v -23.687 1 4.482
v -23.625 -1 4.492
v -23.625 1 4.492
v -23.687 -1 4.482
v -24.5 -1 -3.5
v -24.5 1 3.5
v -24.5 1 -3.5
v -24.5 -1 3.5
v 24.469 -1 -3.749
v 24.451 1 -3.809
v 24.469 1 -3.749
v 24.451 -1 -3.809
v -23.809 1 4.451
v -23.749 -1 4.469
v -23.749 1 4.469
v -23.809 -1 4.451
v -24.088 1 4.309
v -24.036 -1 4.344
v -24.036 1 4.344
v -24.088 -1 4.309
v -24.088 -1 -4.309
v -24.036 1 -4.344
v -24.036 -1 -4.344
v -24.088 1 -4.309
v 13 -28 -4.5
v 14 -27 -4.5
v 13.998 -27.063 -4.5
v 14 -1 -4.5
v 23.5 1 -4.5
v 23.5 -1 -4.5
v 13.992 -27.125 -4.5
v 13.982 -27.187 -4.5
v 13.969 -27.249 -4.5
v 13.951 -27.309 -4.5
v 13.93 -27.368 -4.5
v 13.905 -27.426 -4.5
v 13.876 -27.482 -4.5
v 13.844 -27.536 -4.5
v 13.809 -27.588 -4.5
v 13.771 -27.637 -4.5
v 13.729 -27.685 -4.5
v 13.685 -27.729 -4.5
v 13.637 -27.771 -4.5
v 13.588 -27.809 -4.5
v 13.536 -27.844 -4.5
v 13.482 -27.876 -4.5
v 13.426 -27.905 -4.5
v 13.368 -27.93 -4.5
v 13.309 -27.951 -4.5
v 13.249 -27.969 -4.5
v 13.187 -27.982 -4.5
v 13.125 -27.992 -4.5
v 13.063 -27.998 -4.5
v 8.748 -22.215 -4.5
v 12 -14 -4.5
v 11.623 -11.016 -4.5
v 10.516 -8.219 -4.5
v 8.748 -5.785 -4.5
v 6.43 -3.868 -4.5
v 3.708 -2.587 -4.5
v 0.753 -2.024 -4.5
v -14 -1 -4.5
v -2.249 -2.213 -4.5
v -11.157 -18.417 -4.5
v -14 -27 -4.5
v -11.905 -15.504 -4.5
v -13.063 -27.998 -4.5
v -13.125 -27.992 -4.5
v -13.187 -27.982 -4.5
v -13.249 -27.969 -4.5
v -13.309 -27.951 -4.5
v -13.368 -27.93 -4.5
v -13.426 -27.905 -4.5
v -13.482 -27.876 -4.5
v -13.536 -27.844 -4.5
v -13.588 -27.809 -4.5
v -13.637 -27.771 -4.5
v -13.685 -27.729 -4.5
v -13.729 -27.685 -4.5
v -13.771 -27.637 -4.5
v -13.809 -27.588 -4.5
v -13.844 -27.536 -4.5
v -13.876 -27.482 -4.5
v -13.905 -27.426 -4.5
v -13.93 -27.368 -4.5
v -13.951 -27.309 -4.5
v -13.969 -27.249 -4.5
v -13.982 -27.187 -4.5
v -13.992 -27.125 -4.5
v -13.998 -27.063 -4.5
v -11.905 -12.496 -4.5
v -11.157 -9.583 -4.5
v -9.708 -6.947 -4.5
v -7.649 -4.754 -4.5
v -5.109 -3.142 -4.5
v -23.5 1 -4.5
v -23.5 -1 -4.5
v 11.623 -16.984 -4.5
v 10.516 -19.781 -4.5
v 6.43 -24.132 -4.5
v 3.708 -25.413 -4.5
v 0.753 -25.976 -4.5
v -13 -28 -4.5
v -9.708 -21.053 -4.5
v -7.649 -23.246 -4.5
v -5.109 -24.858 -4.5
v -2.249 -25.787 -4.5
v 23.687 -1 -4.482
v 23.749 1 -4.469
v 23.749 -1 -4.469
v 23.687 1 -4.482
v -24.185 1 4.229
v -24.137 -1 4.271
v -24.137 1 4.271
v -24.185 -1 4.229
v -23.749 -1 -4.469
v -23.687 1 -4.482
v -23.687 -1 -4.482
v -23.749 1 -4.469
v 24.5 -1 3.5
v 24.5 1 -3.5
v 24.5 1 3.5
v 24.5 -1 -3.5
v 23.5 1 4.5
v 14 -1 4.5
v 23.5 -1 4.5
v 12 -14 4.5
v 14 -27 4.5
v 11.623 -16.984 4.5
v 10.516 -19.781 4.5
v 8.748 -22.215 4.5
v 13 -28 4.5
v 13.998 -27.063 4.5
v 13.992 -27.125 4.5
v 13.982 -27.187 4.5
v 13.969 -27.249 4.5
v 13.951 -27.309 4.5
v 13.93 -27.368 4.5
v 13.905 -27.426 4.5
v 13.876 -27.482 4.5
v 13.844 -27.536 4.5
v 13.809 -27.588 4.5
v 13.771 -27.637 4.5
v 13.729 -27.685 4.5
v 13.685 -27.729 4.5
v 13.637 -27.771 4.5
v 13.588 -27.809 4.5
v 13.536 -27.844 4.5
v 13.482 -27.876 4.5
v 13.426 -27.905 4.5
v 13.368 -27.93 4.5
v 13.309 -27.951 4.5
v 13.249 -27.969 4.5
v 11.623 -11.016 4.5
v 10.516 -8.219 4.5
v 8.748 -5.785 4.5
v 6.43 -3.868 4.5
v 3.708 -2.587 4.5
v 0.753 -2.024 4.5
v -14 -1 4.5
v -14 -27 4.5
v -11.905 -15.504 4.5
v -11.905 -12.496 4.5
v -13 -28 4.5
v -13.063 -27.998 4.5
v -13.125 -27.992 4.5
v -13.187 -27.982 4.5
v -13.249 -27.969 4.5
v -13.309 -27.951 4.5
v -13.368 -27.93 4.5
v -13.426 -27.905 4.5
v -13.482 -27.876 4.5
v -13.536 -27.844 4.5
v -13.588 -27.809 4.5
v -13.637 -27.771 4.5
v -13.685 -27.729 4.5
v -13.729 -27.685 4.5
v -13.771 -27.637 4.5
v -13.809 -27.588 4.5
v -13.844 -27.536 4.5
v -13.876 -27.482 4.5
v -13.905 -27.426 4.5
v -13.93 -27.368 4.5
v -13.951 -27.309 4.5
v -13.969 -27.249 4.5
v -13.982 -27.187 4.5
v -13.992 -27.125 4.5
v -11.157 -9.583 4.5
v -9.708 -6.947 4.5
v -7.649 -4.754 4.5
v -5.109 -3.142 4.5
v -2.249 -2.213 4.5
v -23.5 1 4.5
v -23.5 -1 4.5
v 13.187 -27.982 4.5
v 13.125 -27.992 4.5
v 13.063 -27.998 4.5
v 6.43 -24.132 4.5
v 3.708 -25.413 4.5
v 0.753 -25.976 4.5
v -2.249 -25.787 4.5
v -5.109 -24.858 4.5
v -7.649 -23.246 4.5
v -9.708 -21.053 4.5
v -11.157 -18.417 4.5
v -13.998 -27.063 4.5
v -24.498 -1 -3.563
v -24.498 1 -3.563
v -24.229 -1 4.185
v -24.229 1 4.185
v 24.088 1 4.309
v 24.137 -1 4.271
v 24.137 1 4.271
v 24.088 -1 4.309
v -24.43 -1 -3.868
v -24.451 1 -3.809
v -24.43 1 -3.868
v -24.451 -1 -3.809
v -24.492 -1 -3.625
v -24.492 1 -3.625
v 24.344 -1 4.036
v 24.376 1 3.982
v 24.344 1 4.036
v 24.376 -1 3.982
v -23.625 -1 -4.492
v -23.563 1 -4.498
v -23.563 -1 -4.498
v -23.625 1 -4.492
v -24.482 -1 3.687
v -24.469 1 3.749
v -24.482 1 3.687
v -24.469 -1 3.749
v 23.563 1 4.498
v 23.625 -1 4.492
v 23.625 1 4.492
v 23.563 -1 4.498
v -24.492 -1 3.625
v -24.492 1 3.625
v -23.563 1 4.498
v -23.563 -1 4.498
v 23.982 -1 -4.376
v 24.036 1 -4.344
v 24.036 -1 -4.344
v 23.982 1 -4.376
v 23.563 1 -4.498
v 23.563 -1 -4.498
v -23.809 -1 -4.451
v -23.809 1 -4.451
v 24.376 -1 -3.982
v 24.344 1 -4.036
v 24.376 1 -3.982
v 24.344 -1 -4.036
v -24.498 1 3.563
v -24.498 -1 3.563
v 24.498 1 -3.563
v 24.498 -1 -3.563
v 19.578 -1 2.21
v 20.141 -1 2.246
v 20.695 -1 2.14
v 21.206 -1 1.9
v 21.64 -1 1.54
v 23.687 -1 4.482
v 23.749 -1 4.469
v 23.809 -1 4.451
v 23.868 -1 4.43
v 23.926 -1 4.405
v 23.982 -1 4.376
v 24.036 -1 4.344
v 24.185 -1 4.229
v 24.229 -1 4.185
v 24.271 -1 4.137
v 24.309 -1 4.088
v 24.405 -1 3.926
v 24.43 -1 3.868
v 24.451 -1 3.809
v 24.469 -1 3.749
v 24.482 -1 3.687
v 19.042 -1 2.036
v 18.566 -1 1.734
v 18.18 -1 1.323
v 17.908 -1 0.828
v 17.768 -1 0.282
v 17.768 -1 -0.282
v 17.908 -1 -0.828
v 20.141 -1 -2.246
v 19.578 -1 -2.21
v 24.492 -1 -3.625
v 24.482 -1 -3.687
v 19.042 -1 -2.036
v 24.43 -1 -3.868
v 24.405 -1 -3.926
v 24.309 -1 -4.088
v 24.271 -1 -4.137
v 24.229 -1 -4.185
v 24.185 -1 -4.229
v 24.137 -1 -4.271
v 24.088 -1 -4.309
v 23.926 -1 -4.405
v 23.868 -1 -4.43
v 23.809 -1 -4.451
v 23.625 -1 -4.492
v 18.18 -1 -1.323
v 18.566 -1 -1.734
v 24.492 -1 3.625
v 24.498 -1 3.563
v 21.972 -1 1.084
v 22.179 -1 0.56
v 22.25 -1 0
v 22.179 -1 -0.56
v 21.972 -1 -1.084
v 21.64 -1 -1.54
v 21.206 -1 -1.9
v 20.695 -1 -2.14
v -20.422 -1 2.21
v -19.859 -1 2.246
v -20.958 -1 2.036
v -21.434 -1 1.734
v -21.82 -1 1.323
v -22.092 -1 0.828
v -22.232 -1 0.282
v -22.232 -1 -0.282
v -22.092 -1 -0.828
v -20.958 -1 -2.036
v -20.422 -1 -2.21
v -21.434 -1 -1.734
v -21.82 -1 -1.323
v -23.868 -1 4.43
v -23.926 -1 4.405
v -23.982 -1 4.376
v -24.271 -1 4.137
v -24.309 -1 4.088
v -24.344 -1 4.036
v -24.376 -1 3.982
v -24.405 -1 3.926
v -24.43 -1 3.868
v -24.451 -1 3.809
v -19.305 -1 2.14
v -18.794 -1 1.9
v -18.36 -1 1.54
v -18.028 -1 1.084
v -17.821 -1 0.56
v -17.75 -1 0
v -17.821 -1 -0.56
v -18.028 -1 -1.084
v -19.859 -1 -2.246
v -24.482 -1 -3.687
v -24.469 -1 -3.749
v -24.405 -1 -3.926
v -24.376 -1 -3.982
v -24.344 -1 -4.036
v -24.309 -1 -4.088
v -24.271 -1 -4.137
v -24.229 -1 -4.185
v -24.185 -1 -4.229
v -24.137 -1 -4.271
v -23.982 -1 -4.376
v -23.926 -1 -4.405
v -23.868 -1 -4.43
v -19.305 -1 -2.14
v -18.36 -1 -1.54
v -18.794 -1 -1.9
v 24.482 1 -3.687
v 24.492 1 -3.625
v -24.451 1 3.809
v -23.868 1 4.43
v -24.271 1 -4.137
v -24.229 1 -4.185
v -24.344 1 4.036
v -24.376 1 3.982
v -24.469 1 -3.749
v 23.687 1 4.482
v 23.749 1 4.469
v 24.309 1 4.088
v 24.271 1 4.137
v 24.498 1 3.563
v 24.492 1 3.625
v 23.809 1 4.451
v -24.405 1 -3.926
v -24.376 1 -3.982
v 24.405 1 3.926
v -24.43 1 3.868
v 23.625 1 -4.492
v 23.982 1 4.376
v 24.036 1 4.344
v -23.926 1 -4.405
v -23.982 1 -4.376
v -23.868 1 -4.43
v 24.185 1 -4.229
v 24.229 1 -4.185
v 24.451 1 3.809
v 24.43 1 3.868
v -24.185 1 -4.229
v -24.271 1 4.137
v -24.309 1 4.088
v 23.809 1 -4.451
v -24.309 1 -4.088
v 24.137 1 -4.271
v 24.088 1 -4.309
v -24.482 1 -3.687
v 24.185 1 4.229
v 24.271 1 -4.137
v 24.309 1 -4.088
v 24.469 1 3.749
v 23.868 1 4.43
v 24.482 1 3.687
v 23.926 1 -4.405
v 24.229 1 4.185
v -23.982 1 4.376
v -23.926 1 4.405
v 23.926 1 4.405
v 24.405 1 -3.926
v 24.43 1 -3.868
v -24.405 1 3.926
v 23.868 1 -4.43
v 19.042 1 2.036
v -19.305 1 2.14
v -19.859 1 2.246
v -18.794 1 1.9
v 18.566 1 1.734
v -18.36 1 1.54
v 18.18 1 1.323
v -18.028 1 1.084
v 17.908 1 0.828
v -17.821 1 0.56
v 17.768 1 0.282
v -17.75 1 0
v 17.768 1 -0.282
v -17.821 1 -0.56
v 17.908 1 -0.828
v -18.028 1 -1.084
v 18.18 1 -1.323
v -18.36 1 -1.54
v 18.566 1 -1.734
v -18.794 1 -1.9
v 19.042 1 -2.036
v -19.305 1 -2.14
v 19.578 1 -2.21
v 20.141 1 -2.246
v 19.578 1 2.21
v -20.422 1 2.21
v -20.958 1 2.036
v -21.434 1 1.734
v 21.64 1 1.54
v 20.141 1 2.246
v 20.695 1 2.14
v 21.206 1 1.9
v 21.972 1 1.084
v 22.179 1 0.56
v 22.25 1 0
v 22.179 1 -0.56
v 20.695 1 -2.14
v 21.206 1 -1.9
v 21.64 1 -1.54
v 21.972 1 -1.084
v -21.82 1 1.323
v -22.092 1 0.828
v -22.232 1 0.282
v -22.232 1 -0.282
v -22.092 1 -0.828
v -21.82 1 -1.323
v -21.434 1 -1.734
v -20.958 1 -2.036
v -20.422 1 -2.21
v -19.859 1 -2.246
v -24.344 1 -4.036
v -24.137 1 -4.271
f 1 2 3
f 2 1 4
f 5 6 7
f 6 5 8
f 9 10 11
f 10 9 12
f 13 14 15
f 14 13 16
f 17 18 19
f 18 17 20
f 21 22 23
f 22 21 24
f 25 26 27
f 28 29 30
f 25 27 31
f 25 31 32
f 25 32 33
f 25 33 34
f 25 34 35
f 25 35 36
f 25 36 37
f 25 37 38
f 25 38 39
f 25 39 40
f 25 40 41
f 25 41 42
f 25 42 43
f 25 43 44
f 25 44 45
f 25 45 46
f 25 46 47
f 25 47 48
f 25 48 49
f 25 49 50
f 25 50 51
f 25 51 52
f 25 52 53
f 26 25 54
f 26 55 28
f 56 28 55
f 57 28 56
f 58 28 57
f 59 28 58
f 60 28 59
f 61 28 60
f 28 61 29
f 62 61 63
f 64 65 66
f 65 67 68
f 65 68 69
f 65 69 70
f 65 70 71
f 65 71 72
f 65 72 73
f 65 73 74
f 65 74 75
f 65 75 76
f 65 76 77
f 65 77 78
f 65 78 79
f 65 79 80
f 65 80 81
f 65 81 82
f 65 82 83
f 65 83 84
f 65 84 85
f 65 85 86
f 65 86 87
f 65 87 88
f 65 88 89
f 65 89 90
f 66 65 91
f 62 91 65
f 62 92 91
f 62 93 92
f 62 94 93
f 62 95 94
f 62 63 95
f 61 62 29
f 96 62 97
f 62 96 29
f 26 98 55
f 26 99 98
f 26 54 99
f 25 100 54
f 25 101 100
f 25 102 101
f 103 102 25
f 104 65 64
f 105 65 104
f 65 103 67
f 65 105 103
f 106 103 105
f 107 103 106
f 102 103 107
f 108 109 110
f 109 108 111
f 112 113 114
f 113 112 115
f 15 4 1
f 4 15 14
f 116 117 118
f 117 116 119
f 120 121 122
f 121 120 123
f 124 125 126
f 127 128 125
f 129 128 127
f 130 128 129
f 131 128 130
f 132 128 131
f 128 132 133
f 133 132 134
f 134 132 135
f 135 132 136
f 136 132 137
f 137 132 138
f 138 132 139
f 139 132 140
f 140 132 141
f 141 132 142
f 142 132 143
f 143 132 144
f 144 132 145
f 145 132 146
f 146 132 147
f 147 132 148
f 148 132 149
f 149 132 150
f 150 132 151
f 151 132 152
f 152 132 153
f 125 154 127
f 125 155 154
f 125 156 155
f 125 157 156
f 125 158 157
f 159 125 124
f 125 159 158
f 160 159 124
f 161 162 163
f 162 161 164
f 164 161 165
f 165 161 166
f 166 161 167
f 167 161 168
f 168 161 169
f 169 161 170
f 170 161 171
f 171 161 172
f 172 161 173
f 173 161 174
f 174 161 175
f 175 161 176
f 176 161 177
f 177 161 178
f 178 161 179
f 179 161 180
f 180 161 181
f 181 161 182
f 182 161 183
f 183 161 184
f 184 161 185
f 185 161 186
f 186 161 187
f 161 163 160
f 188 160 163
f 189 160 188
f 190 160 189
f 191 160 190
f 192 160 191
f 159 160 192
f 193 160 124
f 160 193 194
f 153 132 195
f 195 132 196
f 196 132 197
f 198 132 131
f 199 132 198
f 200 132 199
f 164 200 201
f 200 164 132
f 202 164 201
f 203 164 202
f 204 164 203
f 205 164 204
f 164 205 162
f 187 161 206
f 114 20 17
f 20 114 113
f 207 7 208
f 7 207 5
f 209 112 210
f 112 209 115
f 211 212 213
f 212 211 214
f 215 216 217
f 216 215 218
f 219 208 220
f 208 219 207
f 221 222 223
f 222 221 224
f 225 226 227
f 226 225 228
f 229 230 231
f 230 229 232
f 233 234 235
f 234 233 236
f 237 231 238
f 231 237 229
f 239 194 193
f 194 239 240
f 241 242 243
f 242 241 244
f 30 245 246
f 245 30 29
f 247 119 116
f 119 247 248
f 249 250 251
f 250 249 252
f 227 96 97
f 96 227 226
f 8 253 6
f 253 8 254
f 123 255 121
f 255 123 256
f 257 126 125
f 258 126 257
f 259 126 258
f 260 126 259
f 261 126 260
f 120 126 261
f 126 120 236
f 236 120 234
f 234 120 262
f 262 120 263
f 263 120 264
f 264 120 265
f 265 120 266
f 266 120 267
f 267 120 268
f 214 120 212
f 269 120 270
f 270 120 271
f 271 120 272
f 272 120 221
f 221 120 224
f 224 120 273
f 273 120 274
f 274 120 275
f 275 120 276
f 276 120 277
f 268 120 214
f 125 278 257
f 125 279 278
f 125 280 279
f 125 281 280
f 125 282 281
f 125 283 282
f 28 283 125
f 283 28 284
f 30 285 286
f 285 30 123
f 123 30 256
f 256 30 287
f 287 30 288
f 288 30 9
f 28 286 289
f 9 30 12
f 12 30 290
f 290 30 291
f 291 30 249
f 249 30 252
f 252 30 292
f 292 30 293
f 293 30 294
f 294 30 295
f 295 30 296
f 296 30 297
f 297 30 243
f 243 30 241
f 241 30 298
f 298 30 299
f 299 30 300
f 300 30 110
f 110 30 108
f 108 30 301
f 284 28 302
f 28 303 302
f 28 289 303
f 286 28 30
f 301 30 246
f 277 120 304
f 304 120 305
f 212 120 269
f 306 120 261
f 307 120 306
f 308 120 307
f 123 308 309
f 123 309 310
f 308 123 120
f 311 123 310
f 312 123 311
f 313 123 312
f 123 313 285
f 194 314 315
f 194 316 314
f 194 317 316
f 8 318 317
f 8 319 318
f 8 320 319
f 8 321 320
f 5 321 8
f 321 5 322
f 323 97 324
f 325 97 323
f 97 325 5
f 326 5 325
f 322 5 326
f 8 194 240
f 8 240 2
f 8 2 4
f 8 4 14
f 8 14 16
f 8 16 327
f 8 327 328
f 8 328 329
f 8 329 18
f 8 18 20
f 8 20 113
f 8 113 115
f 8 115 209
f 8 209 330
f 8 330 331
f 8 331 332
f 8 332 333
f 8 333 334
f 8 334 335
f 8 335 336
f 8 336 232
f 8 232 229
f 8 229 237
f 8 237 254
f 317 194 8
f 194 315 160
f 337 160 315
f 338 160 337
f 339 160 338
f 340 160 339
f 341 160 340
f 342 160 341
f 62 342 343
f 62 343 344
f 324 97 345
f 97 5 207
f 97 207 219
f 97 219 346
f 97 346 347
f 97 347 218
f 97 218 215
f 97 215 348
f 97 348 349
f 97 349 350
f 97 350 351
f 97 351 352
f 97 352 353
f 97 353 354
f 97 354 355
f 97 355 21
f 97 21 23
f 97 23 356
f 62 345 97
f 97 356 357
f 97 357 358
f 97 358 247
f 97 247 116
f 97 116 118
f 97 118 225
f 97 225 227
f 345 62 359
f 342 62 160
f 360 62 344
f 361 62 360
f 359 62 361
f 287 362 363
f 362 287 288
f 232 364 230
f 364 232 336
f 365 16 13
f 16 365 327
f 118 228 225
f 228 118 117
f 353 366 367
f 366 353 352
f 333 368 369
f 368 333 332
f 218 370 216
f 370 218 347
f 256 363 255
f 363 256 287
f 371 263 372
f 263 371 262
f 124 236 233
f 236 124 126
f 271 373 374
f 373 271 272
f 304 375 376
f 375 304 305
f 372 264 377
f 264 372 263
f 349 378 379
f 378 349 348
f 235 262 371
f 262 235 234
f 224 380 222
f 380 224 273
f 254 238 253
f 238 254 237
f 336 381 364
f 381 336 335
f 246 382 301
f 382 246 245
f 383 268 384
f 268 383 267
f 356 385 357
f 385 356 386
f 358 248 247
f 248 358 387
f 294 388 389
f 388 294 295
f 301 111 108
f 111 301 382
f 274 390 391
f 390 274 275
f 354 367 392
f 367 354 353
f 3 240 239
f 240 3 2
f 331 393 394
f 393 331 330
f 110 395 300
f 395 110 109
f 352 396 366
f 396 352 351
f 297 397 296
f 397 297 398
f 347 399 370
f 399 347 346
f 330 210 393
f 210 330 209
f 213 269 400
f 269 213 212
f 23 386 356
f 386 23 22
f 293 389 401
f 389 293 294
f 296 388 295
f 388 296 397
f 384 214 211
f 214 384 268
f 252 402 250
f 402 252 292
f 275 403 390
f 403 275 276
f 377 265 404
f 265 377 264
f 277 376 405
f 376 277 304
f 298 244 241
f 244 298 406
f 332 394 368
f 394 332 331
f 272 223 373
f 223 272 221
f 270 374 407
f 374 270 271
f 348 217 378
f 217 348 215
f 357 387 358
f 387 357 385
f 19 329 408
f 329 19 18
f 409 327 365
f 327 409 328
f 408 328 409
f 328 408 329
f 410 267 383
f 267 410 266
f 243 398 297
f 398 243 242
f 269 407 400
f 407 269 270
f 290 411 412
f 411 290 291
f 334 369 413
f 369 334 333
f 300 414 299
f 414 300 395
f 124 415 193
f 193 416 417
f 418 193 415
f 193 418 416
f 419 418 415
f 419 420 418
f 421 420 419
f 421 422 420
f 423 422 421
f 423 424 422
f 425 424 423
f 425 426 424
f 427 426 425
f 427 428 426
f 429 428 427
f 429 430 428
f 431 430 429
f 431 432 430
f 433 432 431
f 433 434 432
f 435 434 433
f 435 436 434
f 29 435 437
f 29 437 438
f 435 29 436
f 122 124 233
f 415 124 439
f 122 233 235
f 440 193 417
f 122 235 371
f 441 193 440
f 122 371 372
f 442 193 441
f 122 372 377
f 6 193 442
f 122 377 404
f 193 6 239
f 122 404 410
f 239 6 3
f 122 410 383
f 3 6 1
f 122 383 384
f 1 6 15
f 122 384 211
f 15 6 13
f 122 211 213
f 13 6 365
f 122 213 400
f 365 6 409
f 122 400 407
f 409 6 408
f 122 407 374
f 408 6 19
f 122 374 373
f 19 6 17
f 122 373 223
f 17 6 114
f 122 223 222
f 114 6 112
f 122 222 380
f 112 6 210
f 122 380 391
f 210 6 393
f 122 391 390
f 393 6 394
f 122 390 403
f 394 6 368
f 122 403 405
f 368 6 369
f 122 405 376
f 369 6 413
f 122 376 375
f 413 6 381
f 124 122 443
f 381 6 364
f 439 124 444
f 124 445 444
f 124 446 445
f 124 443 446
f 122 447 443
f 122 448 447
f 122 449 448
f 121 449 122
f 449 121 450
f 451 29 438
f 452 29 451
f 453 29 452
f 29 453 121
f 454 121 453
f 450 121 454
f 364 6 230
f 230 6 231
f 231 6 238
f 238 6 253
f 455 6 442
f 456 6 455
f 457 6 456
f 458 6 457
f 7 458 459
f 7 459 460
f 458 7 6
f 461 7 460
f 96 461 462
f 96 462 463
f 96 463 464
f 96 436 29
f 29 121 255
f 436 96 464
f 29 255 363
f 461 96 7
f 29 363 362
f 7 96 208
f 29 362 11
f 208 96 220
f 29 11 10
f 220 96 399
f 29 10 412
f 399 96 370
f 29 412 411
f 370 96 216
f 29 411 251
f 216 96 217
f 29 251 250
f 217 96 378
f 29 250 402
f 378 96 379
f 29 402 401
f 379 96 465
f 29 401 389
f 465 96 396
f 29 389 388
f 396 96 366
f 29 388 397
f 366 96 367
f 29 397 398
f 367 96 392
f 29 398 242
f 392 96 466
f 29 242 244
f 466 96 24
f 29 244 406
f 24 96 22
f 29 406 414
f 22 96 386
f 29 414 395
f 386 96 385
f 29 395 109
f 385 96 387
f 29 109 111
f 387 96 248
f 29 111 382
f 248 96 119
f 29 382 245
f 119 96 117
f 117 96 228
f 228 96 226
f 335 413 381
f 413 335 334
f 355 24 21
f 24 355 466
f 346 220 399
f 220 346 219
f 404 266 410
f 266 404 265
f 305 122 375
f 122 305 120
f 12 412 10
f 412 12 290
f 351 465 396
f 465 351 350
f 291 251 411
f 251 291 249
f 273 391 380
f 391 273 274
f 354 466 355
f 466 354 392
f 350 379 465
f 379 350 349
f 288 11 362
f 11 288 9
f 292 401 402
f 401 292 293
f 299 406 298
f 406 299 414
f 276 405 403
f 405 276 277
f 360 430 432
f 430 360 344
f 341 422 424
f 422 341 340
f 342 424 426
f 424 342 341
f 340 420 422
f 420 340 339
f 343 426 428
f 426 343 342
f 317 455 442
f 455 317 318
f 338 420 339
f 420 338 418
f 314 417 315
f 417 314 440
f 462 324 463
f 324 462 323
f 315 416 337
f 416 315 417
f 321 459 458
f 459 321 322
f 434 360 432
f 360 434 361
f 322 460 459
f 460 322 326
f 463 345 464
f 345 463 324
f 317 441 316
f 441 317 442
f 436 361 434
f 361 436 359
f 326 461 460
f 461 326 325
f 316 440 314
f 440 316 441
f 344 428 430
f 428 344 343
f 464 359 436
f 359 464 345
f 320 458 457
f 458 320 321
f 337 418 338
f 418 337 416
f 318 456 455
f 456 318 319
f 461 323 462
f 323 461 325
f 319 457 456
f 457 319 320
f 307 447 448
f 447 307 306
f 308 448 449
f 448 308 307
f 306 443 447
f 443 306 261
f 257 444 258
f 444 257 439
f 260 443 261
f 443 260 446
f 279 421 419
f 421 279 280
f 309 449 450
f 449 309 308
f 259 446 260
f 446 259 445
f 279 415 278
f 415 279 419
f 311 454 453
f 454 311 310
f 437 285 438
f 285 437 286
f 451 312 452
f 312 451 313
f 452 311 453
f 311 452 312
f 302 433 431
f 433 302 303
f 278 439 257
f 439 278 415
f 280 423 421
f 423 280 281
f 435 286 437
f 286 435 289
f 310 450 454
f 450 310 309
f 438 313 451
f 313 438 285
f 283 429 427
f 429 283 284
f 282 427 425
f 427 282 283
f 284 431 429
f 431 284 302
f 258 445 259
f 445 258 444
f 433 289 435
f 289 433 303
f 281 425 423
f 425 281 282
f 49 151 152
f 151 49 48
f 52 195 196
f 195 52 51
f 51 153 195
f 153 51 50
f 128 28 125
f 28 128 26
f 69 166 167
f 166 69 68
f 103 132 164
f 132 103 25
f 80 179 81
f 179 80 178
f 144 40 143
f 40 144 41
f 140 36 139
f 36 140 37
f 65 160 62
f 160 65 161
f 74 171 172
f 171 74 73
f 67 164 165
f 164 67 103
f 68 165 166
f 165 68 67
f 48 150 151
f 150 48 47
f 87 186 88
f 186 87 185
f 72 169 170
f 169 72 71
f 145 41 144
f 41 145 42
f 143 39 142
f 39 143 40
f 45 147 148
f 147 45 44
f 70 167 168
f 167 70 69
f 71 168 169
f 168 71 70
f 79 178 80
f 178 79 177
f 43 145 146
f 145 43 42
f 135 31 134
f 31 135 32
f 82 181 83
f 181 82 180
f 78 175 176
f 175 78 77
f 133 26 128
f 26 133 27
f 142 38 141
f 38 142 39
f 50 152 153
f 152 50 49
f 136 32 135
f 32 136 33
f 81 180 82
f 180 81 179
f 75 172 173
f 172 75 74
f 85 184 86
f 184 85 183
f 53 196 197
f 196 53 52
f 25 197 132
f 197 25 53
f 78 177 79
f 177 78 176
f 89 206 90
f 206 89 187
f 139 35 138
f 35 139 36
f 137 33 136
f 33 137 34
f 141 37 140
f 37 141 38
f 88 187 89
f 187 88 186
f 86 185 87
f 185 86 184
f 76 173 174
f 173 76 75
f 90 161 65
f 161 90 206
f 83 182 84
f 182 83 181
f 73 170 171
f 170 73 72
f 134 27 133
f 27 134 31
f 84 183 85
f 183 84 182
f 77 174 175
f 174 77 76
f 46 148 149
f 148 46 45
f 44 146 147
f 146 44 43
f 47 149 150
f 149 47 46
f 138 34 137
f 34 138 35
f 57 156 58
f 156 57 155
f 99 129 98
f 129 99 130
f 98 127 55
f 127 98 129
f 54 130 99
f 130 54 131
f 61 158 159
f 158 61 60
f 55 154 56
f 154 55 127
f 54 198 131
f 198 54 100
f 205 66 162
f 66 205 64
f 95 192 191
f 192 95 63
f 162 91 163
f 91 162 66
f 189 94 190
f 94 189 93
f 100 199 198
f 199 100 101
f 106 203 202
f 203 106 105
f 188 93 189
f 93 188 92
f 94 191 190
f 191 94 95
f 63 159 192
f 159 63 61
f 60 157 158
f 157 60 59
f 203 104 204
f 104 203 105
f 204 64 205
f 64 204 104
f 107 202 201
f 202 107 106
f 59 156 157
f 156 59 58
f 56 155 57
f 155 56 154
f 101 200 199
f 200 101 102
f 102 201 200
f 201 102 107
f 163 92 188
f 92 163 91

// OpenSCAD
// file: common.scad
// This work is licensed under a Creative Commons Attribution-ShareAlike 4.0 International License (http://creativecommons.org/licenses/by-sa/4.0/)

module xmove(dist) { translate([dist, 0, 0]) children(); }
module ymove(dist) { translate([0, dist, 0]) children(); }
module zmove(dist) { translate([0, 0, dist]) children(); }
module xrot(angle) { rotate([angle, 0, 0]) children(); }
module yrot(angle) { rotate([0, angle, 0]) children(); }
module zrot(angle) { rotate([0, 0, angle]) children(); }

module round_cube(dimensions, radius, center=false) {
    if (center) {
        translate([0, 0, -0.5]) _round_cube(dimensions, radius, center);
    } else {
        translate([radius, radius, 0]) _round_cube(dimensions, radius);
    }
}

module _round_cube(dimensions, radius, center=false) {
        minkowski() {
            cube([dimensions[0] - radius*2, dimensions[1] - radius*2, dimensions[2] - 1], center=center);
            cylinder(r=radius,h=1);
        }
}


module hollow_cylinder_thick(height, outer_radius, thickness) {
    difference() {
        cylinder(h=height, r=outer_radius, center=true);
        cylinder(h=height + 0.02, r=outer_radius - thickness, center=true);
    }
}

module hollow_cylinder(height, externalDiameter, internalDiameter) {
    difference() {
        cylinder(height, r=externalDiameter/2);
        translate([0, 0, -1]) cylinder(height + 2, r=internalDiameter/2);
    }
}

module screw_hole(screwDiameter, headDiameter, depth, headDepth) {    
    translate([0, 0, -depth]) cylinder(h=4 * depth, r=screwDiameter / 2);
    translate([0, 0, depth - headDepth]) cylinder(h=4 * depth, r=headDiameter / 2);
}

module cylinder_sector(diameter, startAngle, endAngle) {
    cylinder(h=height, d=diameter);
}


$fn=100;
size=10;
distance=0;

round_cube(dimensions=[10,10,3], radius=3);
!round_cube(dimensions=[10,10,3], radius=3, center=true);
hollow_cylinder(height=3, externalDiameter=10, internalDiameter=7);
difference() { cube([10, 10, 3]); translate([5, 5, 0]) screw_hole(screwDiameter=3, headDiameter=6, depth=3, headDepth=1); }
cylinder_sector(height=3, diameter=10, startAngle=0, endAngle=180);
// main file
use <common.scad>;
$fn=25;
diameter = 23.5 + 0.5;

thickness = 2;
hole_diameter = 4.5;
hole_distance = 10;
edge_distance = hole_diameter / 2;
corner_radius = 1;

external_diameter = diameter + 2 * thickness;
hd = ceil((external_diameter + hole_diameter) / hole_distance) * hole_distance;
echo("distance between holes: ", hd);

base_x_size = hd + hole_diameter + edge_distance * 2;
base_y_size = hole_diameter + edge_distance * 2;

rotate([90, 0, 0]) {

difference() {
    round_cube([base_x_size, base_y_size, thickness], corner_radius, true);
    translate([-hd/2, 0, 0]) cylinder(d=hole_diameter, h=thickness + 1, center=true);
    translate([hd/2, 0, 0]) cylinder(d=hole_diameter, h=thickness + 1, center=true);
}

holder_x_size = external_diameter;
holder_y_size = external_diameter;

translate([0, 0, holder_x_size / 2]) rotate([90, 0, 0]) difference() {
    round_cube([holder_x_size, holder_y_size, base_y_size], corner_radius, true);
    cylinder(d=diameter, h=base_y_size + 1, center=true);
}
}
